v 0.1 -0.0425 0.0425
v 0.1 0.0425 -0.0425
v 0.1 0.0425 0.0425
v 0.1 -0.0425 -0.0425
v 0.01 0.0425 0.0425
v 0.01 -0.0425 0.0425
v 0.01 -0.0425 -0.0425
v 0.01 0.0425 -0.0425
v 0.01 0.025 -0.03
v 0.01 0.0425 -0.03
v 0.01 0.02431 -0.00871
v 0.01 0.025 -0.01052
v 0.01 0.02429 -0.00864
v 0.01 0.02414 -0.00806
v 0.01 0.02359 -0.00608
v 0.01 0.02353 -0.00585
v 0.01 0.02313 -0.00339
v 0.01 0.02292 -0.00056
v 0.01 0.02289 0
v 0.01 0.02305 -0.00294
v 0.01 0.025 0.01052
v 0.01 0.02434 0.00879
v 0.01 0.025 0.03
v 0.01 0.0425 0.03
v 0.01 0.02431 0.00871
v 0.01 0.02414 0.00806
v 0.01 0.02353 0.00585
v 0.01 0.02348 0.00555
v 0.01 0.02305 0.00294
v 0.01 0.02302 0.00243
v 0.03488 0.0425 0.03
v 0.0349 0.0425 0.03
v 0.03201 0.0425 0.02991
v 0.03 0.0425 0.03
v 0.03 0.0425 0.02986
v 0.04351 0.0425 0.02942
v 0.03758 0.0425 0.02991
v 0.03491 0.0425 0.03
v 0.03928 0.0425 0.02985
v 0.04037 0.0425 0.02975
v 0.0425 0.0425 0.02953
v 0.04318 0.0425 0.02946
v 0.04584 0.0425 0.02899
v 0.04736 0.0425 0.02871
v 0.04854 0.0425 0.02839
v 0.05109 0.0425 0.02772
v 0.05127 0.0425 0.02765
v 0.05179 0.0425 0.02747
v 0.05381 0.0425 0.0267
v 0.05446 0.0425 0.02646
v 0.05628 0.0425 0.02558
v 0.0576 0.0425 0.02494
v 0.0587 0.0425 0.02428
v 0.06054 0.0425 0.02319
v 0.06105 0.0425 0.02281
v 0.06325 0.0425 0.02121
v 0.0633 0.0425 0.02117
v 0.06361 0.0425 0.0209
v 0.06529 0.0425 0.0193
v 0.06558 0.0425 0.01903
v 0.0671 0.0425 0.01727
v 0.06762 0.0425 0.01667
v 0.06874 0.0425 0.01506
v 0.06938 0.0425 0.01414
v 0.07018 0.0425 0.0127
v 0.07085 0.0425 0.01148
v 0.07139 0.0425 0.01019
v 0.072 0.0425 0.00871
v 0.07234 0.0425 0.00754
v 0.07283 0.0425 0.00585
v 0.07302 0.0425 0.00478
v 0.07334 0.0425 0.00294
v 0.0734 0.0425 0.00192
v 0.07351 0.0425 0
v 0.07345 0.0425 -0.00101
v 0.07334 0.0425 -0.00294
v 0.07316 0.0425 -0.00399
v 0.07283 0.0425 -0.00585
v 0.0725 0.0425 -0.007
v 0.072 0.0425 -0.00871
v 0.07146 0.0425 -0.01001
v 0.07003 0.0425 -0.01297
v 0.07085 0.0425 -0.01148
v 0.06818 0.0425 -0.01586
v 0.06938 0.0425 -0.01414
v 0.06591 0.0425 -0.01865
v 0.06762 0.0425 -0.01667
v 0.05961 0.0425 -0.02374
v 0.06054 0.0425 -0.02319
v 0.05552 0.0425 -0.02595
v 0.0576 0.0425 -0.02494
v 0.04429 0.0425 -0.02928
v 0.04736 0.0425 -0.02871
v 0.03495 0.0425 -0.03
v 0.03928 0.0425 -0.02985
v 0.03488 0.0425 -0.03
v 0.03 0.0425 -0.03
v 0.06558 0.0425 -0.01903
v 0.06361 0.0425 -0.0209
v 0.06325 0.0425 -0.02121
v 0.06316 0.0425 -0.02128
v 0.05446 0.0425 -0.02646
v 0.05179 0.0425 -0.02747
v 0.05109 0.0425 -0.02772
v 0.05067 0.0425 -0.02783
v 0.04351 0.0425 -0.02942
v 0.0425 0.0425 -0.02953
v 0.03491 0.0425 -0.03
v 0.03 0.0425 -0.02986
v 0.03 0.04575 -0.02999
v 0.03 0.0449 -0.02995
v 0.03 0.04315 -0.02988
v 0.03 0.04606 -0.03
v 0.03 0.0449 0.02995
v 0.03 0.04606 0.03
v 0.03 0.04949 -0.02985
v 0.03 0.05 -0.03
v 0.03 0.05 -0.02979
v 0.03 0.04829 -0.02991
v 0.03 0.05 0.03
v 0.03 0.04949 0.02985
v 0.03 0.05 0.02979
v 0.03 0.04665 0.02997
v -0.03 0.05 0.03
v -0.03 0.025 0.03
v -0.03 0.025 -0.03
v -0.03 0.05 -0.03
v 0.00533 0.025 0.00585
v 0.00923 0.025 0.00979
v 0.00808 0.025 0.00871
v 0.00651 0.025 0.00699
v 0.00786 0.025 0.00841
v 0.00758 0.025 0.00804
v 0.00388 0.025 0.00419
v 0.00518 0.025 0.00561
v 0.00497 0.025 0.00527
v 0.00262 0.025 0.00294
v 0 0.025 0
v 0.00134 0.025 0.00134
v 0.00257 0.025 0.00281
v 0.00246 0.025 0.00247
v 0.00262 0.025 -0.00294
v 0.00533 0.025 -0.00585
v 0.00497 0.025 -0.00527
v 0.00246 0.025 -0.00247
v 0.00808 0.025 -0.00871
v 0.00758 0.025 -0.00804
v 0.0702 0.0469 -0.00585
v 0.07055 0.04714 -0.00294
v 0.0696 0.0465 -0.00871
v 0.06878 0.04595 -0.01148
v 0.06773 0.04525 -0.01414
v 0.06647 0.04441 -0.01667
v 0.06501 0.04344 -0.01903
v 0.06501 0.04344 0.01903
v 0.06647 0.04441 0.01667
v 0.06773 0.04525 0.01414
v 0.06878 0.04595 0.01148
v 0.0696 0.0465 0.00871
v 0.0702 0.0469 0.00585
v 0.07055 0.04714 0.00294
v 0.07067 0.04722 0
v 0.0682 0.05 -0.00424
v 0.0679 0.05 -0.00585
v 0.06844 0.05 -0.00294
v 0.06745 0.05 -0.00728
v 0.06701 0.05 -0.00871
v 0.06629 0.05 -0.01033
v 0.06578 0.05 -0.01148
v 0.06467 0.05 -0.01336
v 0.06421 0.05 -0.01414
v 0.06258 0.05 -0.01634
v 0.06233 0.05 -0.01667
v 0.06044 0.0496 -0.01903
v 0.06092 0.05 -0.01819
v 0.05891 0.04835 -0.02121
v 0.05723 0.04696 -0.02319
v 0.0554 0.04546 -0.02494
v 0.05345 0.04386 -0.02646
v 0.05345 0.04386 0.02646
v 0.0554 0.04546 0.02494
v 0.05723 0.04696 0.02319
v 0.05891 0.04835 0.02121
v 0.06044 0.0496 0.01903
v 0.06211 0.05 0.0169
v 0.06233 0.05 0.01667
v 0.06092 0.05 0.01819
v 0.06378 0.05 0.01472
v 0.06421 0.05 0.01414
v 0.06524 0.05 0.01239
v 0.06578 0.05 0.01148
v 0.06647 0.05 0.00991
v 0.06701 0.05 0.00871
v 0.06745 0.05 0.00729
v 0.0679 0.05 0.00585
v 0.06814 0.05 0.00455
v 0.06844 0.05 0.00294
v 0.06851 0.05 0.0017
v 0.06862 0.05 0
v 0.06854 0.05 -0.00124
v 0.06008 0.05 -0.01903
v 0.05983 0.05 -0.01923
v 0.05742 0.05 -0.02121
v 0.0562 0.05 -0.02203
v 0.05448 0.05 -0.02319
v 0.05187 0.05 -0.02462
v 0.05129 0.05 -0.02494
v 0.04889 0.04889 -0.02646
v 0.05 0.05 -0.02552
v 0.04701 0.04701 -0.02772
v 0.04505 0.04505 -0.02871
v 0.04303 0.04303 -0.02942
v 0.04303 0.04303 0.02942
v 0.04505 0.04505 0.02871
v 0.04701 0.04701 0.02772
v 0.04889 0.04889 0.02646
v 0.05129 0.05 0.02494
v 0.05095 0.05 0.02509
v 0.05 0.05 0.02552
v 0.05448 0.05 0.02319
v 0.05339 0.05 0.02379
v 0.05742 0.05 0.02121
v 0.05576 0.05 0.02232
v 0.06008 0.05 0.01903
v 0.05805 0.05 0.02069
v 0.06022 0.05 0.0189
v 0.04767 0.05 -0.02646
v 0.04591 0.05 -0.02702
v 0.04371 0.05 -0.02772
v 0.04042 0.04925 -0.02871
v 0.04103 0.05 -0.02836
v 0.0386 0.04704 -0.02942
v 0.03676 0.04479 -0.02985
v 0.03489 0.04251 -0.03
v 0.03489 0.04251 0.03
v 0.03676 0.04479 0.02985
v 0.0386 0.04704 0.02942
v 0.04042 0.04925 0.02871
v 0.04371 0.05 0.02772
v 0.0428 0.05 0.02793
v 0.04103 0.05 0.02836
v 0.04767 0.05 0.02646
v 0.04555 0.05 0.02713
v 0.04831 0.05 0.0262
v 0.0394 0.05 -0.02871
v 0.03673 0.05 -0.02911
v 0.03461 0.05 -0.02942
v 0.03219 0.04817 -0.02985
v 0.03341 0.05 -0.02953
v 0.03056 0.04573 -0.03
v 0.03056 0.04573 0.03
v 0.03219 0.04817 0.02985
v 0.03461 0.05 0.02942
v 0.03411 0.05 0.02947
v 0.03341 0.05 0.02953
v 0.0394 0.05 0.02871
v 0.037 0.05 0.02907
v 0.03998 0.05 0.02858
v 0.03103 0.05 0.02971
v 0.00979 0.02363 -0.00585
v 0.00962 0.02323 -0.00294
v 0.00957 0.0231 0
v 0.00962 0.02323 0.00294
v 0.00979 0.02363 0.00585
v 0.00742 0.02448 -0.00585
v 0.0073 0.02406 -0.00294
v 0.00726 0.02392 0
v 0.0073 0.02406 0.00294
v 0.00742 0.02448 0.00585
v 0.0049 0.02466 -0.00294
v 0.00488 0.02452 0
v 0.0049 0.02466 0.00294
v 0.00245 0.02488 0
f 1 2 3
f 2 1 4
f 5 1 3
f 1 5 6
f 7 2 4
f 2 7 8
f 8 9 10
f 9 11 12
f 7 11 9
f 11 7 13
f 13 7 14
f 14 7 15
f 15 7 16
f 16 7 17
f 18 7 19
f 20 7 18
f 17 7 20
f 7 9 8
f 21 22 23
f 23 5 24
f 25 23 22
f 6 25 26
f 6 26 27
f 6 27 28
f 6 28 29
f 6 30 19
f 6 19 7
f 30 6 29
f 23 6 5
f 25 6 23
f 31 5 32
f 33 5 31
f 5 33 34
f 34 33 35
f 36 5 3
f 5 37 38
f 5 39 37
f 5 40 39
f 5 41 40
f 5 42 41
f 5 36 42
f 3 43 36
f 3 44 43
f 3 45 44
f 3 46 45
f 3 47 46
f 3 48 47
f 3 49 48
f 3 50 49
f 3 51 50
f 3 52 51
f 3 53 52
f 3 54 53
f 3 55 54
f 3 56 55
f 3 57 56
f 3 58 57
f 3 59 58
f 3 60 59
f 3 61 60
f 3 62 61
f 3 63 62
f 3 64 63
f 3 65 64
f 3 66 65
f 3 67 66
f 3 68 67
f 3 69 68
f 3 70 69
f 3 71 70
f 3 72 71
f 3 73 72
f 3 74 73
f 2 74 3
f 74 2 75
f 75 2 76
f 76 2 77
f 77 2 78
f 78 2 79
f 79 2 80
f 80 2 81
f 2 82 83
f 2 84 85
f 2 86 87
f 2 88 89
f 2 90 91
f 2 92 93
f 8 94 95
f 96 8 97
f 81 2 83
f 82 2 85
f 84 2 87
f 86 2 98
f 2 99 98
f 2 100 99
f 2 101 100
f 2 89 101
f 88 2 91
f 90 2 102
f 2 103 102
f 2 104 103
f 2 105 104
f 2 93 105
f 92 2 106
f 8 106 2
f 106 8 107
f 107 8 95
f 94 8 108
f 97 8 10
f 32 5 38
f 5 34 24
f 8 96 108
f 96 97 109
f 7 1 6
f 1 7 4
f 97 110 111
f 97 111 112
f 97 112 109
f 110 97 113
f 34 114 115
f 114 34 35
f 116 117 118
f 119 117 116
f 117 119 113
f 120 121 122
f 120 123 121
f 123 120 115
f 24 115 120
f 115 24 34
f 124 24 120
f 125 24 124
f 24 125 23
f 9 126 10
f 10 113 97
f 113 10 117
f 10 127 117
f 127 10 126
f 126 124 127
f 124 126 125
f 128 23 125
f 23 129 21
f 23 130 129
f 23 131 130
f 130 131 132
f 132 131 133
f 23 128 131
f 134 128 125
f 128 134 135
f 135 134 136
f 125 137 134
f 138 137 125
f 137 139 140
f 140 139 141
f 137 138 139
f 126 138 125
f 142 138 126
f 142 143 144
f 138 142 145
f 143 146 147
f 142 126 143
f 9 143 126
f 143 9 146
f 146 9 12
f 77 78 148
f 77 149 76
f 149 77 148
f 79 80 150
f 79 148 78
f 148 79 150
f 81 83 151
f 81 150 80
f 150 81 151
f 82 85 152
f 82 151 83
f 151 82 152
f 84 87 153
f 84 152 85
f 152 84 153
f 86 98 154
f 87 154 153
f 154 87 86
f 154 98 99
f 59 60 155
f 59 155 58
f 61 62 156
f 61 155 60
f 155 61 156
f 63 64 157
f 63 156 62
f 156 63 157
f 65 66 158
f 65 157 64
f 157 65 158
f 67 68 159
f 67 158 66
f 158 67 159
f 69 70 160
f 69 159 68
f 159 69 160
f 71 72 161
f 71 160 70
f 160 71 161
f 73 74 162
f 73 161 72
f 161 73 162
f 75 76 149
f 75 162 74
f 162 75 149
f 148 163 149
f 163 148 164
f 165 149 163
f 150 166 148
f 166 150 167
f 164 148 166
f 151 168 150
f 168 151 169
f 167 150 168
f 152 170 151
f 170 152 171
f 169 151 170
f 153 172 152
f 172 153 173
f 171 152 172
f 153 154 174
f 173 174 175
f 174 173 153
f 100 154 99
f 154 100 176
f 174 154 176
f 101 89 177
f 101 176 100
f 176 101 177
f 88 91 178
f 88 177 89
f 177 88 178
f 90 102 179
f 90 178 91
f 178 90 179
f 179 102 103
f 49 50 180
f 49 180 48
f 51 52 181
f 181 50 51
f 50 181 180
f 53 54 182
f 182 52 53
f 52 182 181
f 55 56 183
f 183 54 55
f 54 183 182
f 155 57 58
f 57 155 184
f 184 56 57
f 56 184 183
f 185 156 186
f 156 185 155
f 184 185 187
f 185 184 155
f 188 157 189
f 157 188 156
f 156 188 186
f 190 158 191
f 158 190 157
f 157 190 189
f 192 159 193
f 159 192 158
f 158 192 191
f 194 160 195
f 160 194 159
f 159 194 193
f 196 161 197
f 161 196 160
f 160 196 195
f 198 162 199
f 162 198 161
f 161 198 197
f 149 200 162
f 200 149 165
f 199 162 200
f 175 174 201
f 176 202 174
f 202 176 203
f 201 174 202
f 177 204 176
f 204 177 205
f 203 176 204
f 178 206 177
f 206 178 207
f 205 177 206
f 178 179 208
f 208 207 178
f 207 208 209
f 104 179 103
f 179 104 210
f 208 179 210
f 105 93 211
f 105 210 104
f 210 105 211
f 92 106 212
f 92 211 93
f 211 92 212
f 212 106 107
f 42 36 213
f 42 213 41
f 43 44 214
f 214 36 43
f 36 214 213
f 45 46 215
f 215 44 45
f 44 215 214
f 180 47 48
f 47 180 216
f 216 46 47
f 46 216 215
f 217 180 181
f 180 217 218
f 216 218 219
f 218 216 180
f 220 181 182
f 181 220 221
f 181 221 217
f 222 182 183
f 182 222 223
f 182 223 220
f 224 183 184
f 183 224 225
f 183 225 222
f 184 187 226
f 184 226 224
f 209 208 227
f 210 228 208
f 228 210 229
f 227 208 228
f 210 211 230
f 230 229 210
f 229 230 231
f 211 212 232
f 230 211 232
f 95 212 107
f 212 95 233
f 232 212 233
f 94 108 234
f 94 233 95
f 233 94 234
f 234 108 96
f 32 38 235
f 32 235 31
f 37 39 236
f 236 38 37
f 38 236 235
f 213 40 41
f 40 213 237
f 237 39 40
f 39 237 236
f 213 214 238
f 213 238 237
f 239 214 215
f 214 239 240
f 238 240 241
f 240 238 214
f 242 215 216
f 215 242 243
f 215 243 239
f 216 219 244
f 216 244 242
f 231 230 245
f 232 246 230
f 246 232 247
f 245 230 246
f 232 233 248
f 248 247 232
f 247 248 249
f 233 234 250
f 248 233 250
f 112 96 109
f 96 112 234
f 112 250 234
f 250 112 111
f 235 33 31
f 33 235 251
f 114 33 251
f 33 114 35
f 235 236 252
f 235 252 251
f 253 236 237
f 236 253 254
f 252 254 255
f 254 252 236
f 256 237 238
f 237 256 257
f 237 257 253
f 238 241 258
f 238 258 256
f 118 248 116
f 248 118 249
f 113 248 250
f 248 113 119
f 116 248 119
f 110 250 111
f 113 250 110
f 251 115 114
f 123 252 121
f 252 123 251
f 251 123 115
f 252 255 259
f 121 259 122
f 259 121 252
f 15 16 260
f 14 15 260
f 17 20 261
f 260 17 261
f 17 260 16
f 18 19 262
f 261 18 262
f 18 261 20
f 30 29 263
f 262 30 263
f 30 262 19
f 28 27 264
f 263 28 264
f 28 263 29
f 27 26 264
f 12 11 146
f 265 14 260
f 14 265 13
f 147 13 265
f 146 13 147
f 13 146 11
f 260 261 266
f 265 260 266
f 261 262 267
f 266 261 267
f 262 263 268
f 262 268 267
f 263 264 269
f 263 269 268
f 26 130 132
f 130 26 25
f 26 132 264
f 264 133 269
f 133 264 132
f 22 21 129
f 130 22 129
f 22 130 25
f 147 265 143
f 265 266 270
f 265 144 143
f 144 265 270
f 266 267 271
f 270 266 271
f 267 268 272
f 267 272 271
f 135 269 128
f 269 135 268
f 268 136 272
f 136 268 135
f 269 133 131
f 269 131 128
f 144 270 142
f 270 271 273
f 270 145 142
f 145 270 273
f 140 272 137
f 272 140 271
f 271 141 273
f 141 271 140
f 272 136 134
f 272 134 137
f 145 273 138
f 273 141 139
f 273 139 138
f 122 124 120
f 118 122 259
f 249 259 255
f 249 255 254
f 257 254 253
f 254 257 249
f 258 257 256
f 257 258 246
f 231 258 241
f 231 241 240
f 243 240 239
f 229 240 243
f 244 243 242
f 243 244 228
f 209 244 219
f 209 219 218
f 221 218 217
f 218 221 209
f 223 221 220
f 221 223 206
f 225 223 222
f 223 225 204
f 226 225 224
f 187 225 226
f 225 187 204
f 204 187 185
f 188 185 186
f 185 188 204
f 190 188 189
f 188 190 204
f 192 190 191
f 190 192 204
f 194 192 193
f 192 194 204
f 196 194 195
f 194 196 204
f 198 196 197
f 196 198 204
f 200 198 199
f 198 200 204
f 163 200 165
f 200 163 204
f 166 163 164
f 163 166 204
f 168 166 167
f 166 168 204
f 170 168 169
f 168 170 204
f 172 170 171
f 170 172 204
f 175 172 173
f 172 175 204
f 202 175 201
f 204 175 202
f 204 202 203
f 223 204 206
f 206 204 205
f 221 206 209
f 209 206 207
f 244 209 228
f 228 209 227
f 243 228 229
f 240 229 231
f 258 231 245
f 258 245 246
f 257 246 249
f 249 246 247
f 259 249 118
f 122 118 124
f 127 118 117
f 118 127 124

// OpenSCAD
$fn=64;

L = 0.2;
W = 0.1;
H = 0.1;

module obround_x(len, dia, h){
    hull(){
        translate([-len/2 + dia/2, 0, 0]) cylinder(d=dia, h=h, center=true);
        translate([ len/2 - dia/2, 0, 0]) cylinder(d=dia, h=h, center=true);
    }
}

module elbow_body(){
    union(){
        // Large end block (along +X)
        translate([0.055, 0, 0])
            cube([0.09, 0.085, 0.085], center=true);

        // Small tongue (along +Y)
        translate([0, 0.055, 0])
            cube([0.06, 0.06, 0.06], center=true);

        // Curved transition (quarter torus-like)
        rotate_extrude(angle=90, convexity=10)
            translate([0.055, 0, 0])
                circle(r=0.03);

        // Obround end-cap near smaller end
        translate([0, 0.085, 0])
            obround_x(0.07, 0.05, 0.06);

        // Two small lugs/steps on top near tip
        translate([-0.018, 0.072, 0.035])
            cube([0.02, 0.02, 0.02], center=true);
        translate([ 0.018, 0.072, 0.035])
            cube([0.02, 0.02, 0.02], center=true);
    }
}

module clip_to_bbox(){
    intersection(){
        elbow_body();
        cube([L, W, H], center=true);
    }
}

clip_to_bbox();
